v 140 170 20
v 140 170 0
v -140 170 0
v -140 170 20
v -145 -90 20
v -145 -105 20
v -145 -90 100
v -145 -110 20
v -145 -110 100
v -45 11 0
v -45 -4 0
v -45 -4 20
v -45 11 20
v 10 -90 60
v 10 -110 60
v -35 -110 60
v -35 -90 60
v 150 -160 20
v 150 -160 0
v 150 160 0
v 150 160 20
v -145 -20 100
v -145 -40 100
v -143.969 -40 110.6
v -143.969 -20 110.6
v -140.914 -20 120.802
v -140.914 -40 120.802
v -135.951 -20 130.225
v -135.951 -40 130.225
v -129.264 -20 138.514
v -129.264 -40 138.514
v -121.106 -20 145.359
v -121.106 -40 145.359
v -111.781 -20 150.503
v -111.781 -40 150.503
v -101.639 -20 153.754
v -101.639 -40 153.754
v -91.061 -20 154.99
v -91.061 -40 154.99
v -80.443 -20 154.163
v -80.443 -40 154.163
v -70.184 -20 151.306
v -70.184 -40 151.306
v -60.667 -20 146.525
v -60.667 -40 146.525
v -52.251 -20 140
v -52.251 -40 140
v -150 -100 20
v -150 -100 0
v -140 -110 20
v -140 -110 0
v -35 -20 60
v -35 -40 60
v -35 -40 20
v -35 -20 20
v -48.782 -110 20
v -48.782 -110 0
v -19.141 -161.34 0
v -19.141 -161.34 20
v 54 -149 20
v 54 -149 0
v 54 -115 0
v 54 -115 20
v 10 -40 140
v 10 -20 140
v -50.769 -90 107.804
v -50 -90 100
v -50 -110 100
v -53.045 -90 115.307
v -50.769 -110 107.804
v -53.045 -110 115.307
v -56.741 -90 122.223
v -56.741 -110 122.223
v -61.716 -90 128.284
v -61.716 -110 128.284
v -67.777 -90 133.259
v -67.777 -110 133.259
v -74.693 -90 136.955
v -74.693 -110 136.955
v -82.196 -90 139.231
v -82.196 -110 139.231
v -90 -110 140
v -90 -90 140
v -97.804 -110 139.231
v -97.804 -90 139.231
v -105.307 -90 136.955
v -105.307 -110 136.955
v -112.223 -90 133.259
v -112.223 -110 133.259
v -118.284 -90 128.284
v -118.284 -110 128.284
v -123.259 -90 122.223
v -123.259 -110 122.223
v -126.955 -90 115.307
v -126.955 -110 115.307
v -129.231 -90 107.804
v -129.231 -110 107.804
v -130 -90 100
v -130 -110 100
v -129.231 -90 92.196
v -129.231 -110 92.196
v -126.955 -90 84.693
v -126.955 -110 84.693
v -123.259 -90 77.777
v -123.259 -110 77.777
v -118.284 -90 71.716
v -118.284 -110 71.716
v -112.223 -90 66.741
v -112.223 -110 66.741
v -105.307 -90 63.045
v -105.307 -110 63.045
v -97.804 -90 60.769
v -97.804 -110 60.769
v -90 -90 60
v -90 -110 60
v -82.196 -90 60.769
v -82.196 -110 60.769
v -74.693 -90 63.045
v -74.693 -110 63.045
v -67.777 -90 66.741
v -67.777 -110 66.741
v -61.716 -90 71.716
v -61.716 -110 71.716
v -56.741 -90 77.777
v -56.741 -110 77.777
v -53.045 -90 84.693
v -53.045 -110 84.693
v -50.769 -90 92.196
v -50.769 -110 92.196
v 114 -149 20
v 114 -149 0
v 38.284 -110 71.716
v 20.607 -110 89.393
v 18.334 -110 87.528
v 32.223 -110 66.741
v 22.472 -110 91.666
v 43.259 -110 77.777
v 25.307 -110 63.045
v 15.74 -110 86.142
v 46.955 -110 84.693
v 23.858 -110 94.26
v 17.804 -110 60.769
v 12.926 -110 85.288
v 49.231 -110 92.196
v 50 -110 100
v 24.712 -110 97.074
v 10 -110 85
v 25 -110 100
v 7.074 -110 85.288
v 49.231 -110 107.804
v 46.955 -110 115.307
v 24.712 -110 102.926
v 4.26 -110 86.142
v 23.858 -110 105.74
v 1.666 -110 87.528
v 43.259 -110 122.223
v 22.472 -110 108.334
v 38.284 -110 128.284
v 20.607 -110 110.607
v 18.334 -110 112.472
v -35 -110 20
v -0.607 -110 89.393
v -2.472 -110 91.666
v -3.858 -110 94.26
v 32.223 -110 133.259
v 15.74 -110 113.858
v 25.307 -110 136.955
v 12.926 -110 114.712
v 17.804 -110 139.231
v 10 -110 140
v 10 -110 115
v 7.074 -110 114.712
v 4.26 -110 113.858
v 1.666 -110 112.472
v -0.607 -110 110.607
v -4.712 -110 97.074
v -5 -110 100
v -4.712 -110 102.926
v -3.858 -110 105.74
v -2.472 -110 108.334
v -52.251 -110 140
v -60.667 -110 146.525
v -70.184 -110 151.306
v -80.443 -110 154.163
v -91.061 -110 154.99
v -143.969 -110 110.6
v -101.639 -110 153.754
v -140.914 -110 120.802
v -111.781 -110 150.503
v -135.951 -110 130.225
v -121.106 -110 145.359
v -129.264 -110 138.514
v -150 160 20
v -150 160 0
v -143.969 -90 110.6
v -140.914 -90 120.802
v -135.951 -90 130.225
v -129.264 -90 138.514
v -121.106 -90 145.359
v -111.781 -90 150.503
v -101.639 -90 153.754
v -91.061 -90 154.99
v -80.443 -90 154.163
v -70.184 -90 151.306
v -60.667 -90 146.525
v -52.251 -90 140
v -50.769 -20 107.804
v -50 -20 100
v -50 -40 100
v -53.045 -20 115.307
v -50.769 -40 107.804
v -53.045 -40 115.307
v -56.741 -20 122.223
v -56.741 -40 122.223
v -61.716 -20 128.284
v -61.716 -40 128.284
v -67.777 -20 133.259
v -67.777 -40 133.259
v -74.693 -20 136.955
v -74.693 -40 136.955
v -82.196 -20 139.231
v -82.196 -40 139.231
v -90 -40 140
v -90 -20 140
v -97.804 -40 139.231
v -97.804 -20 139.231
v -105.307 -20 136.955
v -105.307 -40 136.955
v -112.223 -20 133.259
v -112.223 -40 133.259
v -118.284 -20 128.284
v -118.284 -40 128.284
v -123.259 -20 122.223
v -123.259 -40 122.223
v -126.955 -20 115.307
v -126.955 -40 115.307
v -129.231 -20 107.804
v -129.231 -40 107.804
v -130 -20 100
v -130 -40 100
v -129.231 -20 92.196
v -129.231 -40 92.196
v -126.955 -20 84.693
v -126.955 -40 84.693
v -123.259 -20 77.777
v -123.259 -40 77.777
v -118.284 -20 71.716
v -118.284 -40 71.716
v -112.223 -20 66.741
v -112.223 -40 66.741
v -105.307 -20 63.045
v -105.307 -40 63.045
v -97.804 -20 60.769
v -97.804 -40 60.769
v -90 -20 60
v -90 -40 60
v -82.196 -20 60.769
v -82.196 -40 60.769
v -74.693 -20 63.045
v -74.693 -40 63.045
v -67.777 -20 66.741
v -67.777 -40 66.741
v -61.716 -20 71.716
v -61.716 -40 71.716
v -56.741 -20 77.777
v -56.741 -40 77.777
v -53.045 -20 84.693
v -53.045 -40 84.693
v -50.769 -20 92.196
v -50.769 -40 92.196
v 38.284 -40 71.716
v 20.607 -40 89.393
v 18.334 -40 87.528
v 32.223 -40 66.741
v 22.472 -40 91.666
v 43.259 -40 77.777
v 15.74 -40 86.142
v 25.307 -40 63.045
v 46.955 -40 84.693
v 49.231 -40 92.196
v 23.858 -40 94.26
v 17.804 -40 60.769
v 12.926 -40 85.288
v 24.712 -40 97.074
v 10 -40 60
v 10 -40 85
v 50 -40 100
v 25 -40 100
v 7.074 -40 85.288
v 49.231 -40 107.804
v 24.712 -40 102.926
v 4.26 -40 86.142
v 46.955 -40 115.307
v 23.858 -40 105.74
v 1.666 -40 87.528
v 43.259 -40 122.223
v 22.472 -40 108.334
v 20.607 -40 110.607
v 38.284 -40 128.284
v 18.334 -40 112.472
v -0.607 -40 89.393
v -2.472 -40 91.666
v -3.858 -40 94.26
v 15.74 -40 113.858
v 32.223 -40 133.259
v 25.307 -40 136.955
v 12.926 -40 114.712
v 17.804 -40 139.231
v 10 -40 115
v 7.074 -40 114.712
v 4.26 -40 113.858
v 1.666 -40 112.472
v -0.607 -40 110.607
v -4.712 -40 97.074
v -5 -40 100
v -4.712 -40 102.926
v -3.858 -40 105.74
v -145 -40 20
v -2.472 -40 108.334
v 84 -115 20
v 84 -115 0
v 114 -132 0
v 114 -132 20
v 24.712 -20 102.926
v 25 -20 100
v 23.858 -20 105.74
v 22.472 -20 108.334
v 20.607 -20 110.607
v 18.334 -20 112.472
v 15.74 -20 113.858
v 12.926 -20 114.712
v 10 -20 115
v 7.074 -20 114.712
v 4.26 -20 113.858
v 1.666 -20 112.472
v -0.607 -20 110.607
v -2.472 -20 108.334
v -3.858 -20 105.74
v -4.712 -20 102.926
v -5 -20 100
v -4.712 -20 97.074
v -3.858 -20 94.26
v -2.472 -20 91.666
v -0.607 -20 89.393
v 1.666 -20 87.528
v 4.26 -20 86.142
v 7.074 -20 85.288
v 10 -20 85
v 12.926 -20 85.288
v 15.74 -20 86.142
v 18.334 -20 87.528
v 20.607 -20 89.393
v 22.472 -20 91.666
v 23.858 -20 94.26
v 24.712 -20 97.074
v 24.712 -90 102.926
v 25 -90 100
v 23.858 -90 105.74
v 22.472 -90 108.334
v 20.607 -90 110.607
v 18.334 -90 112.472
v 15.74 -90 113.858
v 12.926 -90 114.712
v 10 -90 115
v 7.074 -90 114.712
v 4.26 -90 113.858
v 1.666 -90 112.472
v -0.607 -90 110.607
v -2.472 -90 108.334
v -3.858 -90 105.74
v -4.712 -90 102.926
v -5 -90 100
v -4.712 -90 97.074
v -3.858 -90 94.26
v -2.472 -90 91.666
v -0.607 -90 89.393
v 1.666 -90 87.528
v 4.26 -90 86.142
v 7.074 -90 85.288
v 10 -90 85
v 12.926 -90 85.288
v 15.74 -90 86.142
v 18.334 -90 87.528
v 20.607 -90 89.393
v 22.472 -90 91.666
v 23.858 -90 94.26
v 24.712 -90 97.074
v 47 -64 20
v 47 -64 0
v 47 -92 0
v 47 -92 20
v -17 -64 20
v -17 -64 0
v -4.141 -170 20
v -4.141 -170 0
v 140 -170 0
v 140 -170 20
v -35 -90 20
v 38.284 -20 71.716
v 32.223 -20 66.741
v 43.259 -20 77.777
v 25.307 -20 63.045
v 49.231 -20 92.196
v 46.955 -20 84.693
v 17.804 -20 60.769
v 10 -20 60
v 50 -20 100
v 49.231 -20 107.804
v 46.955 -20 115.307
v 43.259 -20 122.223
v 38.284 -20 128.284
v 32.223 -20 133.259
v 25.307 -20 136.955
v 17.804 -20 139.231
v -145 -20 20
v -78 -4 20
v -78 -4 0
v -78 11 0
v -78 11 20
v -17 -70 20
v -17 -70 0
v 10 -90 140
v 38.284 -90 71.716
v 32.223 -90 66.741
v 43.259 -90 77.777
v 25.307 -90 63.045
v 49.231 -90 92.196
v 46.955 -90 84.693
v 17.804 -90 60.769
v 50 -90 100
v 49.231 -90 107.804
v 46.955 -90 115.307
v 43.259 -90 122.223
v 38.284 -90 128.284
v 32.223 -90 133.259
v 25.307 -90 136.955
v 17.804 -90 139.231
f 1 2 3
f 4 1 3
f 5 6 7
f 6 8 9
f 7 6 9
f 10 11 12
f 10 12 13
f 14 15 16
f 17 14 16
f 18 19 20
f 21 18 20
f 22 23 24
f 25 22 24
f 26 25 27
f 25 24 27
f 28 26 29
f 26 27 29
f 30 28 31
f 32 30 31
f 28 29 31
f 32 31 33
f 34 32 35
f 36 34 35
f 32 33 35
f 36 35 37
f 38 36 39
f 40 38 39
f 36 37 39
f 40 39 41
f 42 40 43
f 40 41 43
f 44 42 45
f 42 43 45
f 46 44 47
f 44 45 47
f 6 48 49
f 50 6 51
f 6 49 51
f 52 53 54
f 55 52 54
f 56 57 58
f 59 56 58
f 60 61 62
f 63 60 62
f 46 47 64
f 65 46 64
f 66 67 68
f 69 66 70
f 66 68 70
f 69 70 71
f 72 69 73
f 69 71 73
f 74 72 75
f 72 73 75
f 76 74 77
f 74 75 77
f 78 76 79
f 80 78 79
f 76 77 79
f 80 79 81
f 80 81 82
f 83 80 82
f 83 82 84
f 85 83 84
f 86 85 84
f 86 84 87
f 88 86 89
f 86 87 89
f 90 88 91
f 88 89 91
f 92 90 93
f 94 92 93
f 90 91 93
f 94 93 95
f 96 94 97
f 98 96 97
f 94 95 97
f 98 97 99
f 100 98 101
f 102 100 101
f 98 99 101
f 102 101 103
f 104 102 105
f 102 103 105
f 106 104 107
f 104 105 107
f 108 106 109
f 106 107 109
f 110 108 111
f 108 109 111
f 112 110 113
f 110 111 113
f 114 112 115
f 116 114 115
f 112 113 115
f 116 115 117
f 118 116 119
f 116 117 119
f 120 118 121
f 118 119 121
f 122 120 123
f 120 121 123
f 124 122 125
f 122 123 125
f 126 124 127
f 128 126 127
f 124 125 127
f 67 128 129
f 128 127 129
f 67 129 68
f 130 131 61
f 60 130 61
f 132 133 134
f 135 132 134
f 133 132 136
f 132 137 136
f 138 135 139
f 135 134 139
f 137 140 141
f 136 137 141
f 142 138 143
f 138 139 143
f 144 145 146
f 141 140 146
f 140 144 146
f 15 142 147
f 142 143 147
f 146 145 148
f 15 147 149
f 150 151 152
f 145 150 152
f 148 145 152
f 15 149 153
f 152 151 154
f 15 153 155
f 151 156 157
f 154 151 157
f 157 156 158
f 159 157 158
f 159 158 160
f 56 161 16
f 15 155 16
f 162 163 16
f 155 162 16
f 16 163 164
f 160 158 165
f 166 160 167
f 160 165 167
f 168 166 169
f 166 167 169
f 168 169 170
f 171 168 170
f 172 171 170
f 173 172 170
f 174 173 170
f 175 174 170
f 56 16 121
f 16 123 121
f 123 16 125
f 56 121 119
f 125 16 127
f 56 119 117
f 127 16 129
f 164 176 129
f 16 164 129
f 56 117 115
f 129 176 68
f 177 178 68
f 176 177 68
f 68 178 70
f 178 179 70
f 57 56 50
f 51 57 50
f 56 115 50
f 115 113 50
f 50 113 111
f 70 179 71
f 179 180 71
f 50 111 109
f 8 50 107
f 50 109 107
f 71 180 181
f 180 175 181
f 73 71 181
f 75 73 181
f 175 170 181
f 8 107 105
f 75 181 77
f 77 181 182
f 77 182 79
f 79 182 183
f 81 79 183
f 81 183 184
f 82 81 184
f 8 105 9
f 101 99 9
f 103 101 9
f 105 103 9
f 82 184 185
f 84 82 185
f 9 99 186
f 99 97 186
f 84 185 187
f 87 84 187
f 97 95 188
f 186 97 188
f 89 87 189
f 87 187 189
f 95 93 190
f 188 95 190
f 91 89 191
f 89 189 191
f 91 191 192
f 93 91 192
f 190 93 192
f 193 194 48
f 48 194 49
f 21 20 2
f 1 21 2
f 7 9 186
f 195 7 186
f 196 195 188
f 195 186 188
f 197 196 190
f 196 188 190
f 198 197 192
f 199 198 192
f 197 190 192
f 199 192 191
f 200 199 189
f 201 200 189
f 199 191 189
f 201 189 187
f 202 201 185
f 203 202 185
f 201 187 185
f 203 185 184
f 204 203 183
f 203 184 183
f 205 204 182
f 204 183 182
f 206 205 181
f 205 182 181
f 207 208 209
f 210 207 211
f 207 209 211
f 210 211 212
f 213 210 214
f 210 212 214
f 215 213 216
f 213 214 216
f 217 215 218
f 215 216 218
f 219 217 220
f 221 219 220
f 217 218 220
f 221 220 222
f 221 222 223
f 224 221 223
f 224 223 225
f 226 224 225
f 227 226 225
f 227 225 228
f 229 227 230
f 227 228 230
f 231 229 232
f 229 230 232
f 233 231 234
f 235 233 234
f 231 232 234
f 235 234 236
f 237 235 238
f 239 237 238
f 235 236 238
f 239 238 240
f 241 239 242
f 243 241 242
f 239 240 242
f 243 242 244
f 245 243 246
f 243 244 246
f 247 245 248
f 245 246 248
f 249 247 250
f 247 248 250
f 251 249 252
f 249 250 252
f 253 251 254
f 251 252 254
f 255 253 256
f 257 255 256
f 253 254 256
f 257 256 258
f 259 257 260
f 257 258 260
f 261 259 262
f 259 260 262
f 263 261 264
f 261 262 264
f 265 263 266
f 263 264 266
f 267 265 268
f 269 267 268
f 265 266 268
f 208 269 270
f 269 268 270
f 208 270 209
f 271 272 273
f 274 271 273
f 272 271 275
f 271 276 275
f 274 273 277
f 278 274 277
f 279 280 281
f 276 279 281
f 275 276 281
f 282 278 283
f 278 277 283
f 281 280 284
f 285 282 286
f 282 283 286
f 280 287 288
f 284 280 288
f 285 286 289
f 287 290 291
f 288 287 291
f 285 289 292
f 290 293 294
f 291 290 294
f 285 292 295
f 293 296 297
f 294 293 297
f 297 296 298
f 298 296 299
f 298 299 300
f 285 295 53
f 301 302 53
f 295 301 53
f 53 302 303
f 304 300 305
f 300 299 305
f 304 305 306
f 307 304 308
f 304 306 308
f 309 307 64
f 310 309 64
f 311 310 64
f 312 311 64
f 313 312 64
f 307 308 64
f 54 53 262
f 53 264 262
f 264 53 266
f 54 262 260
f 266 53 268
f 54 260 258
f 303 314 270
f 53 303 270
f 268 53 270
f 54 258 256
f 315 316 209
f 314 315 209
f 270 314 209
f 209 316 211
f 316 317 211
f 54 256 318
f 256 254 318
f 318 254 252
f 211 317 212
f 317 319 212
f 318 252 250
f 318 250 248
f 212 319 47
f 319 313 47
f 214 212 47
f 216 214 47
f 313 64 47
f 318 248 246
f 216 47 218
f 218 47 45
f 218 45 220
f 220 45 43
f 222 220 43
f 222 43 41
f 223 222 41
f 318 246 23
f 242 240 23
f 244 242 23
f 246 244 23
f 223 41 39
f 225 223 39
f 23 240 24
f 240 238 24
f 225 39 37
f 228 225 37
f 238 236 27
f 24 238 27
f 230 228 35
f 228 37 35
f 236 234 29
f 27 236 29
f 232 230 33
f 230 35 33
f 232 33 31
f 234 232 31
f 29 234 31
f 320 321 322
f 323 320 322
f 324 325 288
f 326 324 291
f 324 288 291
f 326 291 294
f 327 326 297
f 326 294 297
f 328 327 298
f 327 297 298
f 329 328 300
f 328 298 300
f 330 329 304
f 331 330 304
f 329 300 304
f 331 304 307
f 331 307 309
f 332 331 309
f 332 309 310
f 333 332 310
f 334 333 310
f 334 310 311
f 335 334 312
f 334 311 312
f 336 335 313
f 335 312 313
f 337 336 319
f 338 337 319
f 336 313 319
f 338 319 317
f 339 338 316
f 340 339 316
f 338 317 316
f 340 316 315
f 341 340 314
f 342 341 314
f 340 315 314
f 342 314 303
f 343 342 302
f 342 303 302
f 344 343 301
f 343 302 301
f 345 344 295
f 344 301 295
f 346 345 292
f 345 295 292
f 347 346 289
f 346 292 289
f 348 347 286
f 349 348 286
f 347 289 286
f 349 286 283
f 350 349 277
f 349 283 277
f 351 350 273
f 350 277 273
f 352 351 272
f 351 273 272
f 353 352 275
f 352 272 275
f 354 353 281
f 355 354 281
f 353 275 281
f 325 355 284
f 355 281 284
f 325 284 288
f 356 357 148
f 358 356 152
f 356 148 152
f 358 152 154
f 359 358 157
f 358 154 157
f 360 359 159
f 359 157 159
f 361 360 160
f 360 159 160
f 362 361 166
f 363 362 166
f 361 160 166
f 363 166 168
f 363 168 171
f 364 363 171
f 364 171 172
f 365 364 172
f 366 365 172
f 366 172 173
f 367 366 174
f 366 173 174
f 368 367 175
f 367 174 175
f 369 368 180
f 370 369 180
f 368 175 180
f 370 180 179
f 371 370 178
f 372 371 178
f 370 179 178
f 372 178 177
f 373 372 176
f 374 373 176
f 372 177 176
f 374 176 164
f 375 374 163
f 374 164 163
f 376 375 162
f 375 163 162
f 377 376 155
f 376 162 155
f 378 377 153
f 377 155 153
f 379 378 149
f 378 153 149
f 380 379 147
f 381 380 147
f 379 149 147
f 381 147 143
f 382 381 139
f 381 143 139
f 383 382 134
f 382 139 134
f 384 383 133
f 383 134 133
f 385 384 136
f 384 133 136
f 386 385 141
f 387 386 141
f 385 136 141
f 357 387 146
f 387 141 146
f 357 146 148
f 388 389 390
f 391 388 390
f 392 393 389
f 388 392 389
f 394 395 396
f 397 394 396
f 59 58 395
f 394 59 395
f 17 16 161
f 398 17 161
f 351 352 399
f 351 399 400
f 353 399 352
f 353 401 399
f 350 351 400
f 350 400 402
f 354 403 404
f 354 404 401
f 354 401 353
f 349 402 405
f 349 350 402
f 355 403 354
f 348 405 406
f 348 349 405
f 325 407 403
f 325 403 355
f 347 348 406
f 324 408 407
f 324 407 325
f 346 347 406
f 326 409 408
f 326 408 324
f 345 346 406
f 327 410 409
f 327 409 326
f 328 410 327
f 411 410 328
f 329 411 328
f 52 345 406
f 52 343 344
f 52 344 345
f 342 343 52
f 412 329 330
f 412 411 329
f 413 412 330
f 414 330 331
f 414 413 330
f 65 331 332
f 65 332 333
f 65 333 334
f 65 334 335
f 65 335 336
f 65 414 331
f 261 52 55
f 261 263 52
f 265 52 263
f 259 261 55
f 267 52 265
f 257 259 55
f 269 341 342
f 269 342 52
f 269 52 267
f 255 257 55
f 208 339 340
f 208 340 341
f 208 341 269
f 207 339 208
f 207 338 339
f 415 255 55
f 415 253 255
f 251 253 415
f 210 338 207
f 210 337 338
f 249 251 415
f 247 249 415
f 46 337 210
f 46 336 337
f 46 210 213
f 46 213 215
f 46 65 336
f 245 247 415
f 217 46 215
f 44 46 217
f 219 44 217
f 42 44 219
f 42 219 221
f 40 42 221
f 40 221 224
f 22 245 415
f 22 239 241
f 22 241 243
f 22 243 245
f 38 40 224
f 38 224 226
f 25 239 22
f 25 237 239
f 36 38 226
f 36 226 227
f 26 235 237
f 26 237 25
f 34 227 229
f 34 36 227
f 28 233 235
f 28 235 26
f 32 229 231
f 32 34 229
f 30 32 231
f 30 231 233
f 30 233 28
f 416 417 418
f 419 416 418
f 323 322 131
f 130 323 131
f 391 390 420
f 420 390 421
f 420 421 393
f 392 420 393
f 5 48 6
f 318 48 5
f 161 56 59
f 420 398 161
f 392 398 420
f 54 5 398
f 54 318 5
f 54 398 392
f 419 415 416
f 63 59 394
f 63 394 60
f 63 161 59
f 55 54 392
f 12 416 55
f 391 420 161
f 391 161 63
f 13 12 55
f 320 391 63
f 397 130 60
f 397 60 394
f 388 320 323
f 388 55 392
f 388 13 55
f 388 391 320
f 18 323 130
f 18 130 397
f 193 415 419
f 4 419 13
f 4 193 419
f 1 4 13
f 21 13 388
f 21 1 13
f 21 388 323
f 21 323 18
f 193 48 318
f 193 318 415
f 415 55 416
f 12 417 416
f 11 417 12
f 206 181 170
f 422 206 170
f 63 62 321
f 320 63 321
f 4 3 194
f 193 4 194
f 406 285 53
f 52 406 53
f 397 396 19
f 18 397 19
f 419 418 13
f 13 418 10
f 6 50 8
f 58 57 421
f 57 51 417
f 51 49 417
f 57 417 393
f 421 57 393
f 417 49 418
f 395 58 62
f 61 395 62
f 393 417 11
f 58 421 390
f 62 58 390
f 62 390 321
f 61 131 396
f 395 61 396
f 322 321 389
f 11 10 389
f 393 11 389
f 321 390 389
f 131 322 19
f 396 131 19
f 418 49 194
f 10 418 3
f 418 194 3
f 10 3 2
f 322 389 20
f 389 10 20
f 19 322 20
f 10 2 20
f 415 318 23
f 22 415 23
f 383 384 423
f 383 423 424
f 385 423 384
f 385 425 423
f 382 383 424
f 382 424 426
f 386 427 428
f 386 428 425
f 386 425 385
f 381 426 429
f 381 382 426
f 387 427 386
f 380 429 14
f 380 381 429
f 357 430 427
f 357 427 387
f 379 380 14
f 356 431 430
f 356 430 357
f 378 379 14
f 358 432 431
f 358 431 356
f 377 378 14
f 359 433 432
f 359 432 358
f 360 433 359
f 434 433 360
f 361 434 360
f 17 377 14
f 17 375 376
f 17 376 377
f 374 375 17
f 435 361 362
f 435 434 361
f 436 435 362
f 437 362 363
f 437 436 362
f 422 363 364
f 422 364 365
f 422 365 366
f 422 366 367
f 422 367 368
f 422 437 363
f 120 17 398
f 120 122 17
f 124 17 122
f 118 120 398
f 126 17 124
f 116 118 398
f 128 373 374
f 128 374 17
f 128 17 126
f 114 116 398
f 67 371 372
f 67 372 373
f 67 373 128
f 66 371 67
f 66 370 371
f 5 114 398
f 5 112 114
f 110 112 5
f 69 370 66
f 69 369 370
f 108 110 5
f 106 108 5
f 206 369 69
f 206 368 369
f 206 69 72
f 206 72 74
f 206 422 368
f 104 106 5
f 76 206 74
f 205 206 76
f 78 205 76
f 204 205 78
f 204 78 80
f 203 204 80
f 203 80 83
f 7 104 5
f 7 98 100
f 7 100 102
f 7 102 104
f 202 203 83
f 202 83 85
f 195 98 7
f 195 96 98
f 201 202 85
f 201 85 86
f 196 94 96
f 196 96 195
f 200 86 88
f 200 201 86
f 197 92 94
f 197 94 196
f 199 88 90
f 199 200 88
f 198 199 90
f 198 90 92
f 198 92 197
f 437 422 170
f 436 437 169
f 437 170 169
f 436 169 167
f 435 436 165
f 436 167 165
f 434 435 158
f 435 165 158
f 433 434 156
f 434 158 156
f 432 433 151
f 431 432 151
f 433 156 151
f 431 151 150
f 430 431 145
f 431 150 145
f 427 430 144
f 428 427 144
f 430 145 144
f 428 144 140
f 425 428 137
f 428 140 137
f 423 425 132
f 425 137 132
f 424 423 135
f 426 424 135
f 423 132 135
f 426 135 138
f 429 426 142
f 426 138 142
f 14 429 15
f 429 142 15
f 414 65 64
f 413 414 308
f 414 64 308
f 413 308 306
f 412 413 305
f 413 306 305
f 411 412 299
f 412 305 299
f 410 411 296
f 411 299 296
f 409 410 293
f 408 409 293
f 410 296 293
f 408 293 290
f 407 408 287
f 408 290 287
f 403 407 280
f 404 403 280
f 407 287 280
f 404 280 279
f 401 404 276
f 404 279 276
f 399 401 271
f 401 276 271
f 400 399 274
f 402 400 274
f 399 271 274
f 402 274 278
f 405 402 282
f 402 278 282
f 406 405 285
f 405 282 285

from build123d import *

# Parameters (mm, degrees)
SKETCH2_W           = 33
SKETCH2_H           = 15
BOSS_EXTRUDE1_DEPTH = 20
SKETCH7_R           = 40
SKETCH7_R_2         = 15
BOSS_EXTRUDE5_DEPTH = 20
LPATTERN2_COUNT     = 2
LPATTERN2_PITCH     = 70


with BuildPart() as part:
    # Sketch2 → Boss-Extrude1 (new body)
    with BuildSketch(Plane.XY):
        Polygon((-140, -110), (-48.782097787, -110), (-19.141081636, -161.339745962), (-4.141081636, -170), (140, -170), (150, -160), (150, 160), (140, 170), (-140, 170), (-150, 160), (-150, -100), align=None)
        Polygon((84, -115), (114, -132), (114, -149), (54, -149), (54, -115), align=None, mode=Mode.SUBTRACT)
        Polygon((47, -92), (-17, -70), (-17, -64), (47, -64), align=None, mode=Mode.SUBTRACT)
        with Locations((-61.5, 3.5)):
            Rectangle(SKETCH2_W, SKETCH2_H, mode=Mode.SUBTRACT)
    extrude(amount=BOSS_EXTRUDE1_DEPTH)

    # Sketch7 → Boss-Extrude5 (add)
    with BuildSketch(Plane.XZ.offset(110)):
        with BuildLine():
            Line((-145, 20), (-145, 100))
            ThreePointArc((-145, 100), (-111.780674121, 150.503487353), (-52.250827824, 140))
            Line((-52.250827824, 140), (10, 140))
            ThreePointArc((10, 140), (50, 100), (10, 60))
            Line((10, 60), (-35, 60))
            Line((-35, 60), (-35, 20))
            Line((-35, 20), (-145, 20))
        make_face()
        with Locations((-90, 100)):
            Circle(SKETCH7_R, mode=Mode.SUBTRACT)
        with Locations((10, 100)):
            Circle(SKETCH7_R_2, mode=Mode.SUBTRACT)
    boss_extrude5 = extrude(amount=-BOSS_EXTRUDE5_DEPTH)

    # LPattern2: Boss-Extrude5 ×2
    with Locations(*[(0, i * LPATTERN2_PITCH, 0) for i in range(1, LPATTERN2_COUNT)]):
        add(boss_extrude5)


solid = part.part
